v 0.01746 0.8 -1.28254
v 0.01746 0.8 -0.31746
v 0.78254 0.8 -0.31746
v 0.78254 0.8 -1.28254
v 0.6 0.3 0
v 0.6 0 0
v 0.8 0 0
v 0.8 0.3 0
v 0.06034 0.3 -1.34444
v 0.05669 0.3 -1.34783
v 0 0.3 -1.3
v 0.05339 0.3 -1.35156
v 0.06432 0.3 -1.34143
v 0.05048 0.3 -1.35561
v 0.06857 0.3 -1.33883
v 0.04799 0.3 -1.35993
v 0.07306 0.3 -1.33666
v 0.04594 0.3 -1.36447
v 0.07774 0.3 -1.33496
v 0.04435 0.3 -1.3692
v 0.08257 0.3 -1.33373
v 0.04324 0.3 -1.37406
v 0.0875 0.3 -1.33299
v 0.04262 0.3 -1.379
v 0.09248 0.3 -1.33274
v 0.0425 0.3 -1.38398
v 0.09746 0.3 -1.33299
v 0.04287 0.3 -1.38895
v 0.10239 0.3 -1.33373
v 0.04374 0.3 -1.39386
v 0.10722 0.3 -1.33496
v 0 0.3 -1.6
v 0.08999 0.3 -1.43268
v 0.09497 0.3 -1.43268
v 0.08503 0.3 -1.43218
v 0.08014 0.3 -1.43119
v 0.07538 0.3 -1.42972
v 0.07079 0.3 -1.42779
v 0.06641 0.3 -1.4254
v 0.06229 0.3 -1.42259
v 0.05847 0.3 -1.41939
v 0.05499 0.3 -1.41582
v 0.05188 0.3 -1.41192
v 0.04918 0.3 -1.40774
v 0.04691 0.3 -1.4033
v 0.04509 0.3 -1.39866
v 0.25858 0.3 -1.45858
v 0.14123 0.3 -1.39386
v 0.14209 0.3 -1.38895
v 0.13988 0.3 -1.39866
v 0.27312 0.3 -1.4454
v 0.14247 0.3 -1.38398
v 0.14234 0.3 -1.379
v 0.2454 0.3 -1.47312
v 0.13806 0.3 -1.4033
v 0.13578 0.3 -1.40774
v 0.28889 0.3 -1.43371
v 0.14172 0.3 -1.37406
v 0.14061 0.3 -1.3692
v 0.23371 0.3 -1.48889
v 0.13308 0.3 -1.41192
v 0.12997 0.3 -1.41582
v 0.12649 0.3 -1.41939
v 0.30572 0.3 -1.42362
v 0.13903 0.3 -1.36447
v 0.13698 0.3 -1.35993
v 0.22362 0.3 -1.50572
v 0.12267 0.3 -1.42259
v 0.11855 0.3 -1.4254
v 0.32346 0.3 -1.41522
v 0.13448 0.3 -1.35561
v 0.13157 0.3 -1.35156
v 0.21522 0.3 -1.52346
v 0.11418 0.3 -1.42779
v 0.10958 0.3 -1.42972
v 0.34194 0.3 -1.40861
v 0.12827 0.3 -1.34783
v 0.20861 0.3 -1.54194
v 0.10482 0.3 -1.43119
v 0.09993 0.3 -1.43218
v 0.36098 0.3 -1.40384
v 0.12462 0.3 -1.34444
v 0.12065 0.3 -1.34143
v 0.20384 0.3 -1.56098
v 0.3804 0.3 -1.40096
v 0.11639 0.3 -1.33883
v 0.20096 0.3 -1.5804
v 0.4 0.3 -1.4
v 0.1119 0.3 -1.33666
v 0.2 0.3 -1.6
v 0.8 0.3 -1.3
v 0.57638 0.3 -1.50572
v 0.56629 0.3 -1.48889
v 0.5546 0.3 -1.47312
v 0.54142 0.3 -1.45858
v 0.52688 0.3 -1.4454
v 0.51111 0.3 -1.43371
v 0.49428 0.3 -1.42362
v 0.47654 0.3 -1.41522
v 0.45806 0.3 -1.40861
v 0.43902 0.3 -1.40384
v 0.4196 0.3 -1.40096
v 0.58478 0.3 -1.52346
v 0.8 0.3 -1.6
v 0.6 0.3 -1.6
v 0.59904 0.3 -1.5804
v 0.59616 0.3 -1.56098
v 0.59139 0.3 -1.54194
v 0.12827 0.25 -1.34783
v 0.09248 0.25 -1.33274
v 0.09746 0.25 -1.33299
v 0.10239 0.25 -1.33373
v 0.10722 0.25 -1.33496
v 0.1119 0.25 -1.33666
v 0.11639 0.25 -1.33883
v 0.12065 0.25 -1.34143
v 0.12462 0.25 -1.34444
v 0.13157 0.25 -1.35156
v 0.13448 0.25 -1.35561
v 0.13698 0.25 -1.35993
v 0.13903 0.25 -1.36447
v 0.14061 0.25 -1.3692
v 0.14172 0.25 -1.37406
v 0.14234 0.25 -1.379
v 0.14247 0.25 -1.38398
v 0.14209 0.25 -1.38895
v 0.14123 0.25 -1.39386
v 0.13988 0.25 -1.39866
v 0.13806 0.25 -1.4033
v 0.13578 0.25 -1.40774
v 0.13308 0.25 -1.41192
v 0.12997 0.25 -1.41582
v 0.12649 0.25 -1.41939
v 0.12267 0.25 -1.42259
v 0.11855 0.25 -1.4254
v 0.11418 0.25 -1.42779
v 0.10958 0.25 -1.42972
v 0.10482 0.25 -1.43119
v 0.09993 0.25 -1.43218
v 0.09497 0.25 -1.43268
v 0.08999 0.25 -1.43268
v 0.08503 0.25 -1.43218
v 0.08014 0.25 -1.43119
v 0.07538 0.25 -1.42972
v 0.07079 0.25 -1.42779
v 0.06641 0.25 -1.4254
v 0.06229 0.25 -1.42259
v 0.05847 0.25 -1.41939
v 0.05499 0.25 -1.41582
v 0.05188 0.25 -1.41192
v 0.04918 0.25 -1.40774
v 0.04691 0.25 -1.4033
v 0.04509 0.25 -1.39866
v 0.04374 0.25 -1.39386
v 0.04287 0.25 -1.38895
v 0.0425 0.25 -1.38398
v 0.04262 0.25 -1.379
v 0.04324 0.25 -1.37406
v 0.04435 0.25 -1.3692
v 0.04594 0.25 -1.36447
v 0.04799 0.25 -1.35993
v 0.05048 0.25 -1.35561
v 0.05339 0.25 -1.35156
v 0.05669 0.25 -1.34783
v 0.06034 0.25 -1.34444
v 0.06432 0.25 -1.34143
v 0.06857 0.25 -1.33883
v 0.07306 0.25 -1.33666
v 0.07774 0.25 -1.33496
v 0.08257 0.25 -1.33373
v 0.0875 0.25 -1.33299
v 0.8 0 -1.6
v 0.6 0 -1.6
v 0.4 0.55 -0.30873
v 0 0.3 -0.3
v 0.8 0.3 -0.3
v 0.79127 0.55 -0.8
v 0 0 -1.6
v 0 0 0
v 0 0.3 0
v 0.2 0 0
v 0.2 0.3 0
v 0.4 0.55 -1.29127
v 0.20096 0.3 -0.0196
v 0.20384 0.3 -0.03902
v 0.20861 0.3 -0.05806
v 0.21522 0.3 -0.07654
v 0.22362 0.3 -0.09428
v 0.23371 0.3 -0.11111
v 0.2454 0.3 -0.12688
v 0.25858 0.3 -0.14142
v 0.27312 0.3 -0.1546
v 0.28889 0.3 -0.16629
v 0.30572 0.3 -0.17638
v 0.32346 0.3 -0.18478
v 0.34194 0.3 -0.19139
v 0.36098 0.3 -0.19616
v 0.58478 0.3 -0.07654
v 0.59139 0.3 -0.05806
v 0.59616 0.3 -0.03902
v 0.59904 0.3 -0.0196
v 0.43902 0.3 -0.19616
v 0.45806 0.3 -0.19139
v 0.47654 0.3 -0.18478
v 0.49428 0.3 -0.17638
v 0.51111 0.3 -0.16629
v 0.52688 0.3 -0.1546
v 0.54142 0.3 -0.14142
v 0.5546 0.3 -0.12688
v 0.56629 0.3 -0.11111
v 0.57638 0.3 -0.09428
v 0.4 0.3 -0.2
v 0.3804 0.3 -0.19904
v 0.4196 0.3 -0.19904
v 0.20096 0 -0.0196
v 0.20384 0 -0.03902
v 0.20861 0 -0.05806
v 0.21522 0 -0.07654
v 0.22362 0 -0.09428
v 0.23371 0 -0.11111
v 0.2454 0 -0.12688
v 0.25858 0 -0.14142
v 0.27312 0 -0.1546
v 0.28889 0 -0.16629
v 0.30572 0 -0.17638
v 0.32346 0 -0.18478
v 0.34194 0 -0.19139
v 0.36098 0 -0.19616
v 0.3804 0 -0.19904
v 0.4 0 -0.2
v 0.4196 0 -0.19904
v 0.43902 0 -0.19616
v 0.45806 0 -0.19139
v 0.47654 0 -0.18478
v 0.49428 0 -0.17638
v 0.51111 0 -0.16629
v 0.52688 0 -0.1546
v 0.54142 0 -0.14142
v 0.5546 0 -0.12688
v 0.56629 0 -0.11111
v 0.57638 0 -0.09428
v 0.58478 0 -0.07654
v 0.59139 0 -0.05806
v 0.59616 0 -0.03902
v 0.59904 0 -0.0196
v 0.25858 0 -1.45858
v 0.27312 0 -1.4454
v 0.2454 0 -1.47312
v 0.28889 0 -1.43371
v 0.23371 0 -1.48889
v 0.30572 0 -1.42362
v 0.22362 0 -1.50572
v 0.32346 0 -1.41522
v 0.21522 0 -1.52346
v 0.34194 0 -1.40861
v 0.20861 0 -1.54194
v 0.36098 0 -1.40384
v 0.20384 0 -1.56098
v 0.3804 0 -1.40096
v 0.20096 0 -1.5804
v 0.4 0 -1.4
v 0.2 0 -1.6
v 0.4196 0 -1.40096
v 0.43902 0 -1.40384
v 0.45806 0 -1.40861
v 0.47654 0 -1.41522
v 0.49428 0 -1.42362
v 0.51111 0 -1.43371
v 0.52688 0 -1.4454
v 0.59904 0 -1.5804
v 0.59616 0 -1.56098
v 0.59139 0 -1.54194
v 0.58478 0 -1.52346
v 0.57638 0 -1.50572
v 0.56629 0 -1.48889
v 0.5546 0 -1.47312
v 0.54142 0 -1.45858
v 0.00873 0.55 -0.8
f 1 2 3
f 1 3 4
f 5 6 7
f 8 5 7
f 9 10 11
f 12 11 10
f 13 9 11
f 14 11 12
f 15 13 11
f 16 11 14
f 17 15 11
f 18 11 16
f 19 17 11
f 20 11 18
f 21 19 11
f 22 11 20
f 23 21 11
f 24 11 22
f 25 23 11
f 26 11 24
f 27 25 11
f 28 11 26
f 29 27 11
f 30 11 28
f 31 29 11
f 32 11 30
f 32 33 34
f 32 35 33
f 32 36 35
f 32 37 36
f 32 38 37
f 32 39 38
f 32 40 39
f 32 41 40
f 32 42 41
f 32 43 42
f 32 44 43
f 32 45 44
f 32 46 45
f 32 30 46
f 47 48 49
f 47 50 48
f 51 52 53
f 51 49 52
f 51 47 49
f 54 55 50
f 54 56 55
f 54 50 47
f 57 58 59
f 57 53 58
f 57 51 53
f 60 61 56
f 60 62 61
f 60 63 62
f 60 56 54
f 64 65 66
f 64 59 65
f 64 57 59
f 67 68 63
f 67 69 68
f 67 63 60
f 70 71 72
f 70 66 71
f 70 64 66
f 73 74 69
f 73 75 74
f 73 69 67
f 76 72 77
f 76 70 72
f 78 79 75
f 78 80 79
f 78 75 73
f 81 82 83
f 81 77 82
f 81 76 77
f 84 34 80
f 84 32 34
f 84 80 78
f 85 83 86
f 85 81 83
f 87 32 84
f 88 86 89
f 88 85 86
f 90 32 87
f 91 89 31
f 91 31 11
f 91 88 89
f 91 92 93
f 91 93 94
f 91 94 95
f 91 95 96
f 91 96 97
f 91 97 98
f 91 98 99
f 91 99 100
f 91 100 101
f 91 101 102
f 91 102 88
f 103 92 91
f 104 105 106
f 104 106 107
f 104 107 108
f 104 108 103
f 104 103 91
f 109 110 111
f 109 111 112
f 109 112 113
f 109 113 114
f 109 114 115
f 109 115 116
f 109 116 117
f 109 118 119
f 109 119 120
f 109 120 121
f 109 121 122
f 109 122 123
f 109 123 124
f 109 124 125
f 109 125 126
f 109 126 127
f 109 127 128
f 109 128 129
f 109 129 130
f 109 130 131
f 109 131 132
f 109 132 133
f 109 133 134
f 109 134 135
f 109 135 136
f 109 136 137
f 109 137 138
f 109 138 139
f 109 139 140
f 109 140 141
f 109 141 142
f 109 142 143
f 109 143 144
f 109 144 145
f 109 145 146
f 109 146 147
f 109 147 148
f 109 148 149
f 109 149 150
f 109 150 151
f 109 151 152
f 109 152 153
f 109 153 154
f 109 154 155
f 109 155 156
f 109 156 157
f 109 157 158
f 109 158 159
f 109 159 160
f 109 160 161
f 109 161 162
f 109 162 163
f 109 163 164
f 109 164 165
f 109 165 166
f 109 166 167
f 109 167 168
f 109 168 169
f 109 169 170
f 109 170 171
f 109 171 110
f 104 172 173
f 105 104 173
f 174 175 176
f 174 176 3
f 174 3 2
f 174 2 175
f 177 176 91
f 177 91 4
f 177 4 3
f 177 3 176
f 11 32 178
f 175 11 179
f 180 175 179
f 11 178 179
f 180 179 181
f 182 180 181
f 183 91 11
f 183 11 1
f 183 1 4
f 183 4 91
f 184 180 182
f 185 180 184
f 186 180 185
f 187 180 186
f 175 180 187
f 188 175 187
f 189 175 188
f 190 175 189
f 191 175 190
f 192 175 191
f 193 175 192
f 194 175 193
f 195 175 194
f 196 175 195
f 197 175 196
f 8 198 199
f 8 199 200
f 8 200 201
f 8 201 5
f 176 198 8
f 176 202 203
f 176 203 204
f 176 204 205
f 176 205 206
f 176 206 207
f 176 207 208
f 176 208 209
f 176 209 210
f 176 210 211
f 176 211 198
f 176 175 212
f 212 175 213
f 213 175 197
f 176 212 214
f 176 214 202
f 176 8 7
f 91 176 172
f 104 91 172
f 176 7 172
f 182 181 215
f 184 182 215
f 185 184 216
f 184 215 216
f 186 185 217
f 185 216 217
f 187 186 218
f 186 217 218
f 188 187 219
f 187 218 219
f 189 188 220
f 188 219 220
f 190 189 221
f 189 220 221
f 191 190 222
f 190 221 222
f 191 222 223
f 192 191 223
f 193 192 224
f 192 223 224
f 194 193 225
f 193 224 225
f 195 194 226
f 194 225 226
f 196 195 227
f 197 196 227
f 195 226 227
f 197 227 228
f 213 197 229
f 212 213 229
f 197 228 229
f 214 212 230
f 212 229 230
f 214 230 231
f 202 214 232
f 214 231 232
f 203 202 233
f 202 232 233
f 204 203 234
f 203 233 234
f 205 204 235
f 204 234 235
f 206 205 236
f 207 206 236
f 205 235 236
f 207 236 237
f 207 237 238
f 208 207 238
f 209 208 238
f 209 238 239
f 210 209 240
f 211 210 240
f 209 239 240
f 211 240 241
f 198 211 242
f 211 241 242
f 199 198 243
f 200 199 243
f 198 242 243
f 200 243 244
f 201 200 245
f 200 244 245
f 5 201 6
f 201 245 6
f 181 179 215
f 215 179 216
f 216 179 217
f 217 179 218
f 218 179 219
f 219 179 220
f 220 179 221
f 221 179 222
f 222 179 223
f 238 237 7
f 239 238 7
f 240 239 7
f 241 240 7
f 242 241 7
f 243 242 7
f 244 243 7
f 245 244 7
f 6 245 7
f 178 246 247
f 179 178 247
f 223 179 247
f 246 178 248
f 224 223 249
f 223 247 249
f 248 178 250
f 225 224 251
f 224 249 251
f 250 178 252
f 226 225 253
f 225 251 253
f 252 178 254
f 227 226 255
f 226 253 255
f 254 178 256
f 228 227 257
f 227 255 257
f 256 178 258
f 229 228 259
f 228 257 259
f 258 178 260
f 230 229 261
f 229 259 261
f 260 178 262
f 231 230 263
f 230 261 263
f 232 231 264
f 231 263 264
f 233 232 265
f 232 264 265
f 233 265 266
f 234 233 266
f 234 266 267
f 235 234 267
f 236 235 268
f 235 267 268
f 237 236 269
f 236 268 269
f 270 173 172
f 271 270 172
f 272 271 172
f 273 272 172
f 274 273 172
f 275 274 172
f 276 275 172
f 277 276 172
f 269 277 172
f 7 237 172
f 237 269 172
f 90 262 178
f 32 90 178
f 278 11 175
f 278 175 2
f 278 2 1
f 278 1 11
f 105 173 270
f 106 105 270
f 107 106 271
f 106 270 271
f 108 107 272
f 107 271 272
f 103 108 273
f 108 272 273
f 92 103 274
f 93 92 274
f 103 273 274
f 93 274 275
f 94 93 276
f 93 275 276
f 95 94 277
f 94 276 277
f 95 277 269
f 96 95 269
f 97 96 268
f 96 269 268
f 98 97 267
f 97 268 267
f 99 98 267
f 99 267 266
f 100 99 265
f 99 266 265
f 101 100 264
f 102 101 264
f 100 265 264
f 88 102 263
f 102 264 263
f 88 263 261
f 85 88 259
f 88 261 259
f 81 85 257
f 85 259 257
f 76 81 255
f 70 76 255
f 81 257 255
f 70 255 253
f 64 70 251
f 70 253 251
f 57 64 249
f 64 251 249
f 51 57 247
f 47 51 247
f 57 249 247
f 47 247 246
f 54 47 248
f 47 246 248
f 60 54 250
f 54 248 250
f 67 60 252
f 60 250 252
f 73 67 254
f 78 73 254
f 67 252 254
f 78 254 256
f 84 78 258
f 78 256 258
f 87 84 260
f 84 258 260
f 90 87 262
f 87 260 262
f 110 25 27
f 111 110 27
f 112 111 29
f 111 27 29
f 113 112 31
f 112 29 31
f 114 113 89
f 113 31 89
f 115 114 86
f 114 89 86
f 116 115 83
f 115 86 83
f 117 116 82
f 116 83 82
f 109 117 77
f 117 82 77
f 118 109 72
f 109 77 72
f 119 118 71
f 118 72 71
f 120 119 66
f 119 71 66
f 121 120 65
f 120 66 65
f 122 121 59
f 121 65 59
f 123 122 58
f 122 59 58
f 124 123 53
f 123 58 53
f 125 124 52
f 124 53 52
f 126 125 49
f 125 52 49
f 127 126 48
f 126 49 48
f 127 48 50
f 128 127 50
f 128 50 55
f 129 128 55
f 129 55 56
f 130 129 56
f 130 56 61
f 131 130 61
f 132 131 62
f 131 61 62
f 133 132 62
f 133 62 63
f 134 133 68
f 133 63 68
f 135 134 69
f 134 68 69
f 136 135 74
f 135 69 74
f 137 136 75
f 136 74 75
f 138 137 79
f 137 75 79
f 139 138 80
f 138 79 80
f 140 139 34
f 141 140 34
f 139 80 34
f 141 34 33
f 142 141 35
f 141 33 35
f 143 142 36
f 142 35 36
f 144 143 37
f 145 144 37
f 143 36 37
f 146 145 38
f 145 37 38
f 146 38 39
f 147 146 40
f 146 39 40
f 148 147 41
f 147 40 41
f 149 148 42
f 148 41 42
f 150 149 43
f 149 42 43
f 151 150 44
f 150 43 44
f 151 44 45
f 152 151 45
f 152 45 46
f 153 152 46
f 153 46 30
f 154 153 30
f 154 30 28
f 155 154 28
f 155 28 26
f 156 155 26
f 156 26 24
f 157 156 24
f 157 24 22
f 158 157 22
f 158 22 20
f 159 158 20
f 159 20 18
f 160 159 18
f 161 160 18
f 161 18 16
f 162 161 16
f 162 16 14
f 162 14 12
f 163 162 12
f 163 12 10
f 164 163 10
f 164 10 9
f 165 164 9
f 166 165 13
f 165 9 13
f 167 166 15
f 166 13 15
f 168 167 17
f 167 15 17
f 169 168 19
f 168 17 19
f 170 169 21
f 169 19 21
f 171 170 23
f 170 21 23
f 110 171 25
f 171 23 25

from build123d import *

# Parameters (mm, degrees)
ESTRUSIONE_ESTRUSIONE1_DEPTH = 0.3
SCHIZZO2_R                   = 0.05
TAGLIO_ESTRUSIONE1_DEPTH     = 0.05
SCHIZZO3_W                   = 0.8
SCHIZZO3_H                   = 1
ESTRUSIONE_ESTRUSIONE2_DEPTH = 0.5
ESTRUSIONE_ESTRUSIONE2_TAPER = 2


with BuildPart() as part:
    # Schizzo1 → Estrusione-Estrusione1 (new body)
    with BuildSketch(Plane(origin=(0, 0, 0), x_dir=(1, 0, 0), z_dir=(0, 1, 0))):
        with BuildLine():
            Line((0.8, 1.6), (0.6, 1.6))
            ThreePointArc((0.6, 1.6), (0.4, 1.4), (0.2, 1.6))
            Line((0.2, 1.6), (0, 1.6))
            Line((0, 1.6), (0, 0))
            Line((0, 0), (0.2, 0))
            ThreePointArc((0.2, 0), (0.4, 0.2), (0.6, 0))
            Line((0.6, 0), (0.8, 0))
            Line((0.8, 0), (0.8, 1.6))
        make_face()
    extrude(amount=ESTRUSIONE_ESTRUSIONE1_DEPTH)

    # Schizzo2 → Taglio-Estrusione1 (cut)
    with BuildSketch(Plane(origin=(0, 0.3, 0), x_dir=(1, 0, 0), z_dir=(0, 1, 0))):
        with Locations(Location((0.092481548, 1.382737711, 0), (0, 0, 270))):
            Circle(SCHIZZO2_R)
    extrude(amount=-TAGLIO_ESTRUSIONE1_DEPTH, mode=Mode.SUBTRACT)

    # Schizzo3 → Estrusione-Estrusione2 (add)
    with BuildSketch(Plane(origin=(0, 0.3, 0), x_dir=(1, 0, 0), z_dir=(0, 1, 0))):
        with Locations((0.4, 0.8)):
            Rectangle(SCHIZZO3_W, SCHIZZO3_H)
    extrude(amount=ESTRUSIONE_ESTRUSIONE2_DEPTH, taper=ESTRUSIONE_ESTRUSIONE2_TAPER)


solid = part.part
